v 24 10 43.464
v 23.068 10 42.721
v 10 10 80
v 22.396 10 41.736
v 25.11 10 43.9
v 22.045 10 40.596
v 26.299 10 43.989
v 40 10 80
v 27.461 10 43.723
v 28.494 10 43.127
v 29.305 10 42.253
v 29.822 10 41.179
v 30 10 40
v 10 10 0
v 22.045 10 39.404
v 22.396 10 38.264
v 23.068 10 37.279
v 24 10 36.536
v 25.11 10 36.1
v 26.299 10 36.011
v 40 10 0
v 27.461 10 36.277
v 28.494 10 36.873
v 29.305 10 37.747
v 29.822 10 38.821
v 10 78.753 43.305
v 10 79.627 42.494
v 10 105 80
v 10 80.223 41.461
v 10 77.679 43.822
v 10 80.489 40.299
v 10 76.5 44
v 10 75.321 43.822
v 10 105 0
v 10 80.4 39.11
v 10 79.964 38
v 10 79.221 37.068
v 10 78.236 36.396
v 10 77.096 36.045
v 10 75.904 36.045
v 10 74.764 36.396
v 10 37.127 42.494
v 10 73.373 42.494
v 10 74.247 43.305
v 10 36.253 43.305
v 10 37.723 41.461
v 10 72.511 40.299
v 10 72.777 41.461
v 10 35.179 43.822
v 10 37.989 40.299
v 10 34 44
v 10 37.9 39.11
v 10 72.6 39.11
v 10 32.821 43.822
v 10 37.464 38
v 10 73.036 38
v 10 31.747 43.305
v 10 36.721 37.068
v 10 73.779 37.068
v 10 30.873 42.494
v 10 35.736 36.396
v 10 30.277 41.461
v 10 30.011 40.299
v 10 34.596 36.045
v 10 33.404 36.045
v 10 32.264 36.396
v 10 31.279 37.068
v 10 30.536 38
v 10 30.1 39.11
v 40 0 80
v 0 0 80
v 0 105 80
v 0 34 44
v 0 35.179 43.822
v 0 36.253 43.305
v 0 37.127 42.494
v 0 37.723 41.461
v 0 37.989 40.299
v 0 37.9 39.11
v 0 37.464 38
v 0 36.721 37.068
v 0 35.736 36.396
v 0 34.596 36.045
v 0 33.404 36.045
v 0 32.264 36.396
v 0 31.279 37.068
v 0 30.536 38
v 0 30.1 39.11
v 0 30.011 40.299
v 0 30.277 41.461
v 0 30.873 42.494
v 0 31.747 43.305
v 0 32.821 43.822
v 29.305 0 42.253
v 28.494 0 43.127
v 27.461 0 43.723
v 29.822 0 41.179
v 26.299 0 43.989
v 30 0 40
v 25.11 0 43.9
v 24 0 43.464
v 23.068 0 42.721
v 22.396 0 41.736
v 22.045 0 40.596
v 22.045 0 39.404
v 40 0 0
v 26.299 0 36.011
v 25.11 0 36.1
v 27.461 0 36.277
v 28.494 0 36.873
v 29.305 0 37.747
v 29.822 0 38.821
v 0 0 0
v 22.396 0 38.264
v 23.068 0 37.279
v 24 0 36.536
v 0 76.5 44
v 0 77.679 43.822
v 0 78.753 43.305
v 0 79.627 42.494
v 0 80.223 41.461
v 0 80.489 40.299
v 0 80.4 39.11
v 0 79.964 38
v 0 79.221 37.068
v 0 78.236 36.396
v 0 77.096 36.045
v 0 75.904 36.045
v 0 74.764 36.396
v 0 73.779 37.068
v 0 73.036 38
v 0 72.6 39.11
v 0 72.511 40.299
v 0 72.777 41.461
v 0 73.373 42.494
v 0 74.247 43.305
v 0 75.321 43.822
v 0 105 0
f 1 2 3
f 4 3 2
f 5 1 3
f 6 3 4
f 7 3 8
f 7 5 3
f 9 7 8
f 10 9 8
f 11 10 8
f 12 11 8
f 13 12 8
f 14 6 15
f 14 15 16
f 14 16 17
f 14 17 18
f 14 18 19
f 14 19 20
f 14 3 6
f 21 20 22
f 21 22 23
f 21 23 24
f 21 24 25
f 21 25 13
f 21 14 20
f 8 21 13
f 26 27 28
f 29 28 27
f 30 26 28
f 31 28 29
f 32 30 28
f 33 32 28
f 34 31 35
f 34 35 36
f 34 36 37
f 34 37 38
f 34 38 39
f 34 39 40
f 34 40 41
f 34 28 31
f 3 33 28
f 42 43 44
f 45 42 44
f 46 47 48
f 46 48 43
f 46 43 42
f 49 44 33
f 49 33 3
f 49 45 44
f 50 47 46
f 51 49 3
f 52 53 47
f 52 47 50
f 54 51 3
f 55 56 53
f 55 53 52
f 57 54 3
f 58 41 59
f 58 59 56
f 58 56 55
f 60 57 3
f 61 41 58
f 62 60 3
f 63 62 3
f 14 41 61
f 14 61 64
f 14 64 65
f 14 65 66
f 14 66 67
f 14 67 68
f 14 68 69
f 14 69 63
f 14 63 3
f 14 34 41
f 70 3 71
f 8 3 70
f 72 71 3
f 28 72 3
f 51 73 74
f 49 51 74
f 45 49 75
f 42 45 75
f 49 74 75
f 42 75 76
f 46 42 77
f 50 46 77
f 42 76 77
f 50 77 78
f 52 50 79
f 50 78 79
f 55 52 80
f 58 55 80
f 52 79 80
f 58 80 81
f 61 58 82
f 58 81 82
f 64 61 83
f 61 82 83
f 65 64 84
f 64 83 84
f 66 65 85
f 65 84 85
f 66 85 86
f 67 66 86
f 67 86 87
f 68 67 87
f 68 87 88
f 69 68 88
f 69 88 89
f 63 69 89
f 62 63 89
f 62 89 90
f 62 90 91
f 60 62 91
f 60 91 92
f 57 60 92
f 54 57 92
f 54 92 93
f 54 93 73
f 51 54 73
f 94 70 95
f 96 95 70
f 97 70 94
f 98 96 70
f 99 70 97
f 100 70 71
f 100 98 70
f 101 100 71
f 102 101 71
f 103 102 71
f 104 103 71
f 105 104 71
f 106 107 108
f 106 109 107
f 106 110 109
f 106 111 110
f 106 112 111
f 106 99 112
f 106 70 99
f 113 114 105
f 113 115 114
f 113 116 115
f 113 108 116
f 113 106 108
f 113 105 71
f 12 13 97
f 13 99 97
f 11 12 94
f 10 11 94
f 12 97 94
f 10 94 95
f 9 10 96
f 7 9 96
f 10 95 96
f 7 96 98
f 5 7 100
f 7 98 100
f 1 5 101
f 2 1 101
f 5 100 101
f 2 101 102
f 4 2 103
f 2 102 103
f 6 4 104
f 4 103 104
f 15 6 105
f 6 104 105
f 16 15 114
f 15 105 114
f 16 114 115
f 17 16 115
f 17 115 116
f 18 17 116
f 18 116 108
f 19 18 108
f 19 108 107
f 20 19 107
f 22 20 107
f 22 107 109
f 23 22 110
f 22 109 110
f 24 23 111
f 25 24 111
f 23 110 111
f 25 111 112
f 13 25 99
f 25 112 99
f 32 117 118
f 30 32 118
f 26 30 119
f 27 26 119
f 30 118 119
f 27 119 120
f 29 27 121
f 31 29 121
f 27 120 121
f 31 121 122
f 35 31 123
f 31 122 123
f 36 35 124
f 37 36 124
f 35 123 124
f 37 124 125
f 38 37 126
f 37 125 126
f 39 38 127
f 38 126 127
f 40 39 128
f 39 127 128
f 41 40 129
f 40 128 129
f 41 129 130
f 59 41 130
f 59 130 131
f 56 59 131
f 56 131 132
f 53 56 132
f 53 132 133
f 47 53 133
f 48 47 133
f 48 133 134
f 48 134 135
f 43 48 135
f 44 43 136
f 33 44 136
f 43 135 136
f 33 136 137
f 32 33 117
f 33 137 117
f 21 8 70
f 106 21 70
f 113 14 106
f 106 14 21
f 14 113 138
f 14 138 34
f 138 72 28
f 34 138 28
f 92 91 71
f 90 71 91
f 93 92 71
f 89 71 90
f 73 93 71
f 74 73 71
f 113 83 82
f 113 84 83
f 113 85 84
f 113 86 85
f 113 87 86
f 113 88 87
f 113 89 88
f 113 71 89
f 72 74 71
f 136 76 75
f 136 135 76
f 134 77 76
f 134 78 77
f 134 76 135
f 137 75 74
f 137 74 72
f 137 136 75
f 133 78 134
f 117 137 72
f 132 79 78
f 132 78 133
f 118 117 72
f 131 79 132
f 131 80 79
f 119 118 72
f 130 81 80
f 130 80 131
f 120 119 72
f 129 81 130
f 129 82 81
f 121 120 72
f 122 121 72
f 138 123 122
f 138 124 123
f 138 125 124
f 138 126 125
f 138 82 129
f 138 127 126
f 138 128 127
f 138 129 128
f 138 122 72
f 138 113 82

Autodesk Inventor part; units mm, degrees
ref_plane "YZ Plane" through (0, 0, 0) normal (1, 0, 0) x (0, 1, 0)
ref_plane "XZ Plane" through (0, 0, 0) normal (0, 1, 0) x (-1, 0, 0)
ref_plane "XY Plane" through (0, 0, 0) normal (0, 0, 1) x (1, 0, 0)
sketch "Sketch1" plane through (0, 0, 0) normal (0, 0, 1) x (1, 0, 0)
  line L0 (0, 0) -> (0, 105)
  line L1 (0, 105) -> (10, 105)
  line L2 (10, 105) -> (10, 10)
  line L3 (10, 10) -> (40, 10)
  line L4 (40, 10) -> (40, 0)
  line L5 (40, 0) -> (0, 0)
  dimension "d0" = 105
  dimension "d1" = 10
  dimension "d2" = 95
  dimension "d3" = 30
  dimension "d4" = 10
  dimension "d5" = 40
extrude "Extrusion1" add sketch "Sketch1" along normal blind 80
sketch "Sketch2" plane through (0, 0, 0) normal (-1, 0, 0) x (0, 0, 1)
  circle A0 centre (40, 34) radius 4
  point P0 (0, 0)
  dimension "d8" = 8
extrude "Extrusion2" cut sketch "Sketch2" against normal blind 10
pattern_linear "Rectangular Pattern1" count 2 spacing 42.5 along (0, 1, 0) of "Extrusion2"
sketch "Sketch3" plane through (0, 0, 0) normal (0, -1, 0) x (1, 0, 0)
  circle A0 centre (26, 40) radius 4
  point P0 (0, 0)
  dimension "d14" = 8
extrude "Extrusion3" cut sketch "Sketch3" against normal blind 10
properties part number "AutoCad Part3"
